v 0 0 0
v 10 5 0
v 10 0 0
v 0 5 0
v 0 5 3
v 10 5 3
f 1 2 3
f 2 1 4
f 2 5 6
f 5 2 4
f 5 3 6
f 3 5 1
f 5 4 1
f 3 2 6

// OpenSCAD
// taken from https://en.wikibooks.org/wiki/OpenSCAD_User_Manual/Primitive_Solids

module prism(l, w, h){
  polyhedron(
    points=[[0,0,0], [l,0,0], [l,w,0], [0,w,0], [0,w,h], [l,w,h]],
    faces=[[0,1,2,3],[5,4,3,2],[0,4,5,1],[0,3,4],[5,2,1]]
    );
  }

prism(10, 5, 3);
